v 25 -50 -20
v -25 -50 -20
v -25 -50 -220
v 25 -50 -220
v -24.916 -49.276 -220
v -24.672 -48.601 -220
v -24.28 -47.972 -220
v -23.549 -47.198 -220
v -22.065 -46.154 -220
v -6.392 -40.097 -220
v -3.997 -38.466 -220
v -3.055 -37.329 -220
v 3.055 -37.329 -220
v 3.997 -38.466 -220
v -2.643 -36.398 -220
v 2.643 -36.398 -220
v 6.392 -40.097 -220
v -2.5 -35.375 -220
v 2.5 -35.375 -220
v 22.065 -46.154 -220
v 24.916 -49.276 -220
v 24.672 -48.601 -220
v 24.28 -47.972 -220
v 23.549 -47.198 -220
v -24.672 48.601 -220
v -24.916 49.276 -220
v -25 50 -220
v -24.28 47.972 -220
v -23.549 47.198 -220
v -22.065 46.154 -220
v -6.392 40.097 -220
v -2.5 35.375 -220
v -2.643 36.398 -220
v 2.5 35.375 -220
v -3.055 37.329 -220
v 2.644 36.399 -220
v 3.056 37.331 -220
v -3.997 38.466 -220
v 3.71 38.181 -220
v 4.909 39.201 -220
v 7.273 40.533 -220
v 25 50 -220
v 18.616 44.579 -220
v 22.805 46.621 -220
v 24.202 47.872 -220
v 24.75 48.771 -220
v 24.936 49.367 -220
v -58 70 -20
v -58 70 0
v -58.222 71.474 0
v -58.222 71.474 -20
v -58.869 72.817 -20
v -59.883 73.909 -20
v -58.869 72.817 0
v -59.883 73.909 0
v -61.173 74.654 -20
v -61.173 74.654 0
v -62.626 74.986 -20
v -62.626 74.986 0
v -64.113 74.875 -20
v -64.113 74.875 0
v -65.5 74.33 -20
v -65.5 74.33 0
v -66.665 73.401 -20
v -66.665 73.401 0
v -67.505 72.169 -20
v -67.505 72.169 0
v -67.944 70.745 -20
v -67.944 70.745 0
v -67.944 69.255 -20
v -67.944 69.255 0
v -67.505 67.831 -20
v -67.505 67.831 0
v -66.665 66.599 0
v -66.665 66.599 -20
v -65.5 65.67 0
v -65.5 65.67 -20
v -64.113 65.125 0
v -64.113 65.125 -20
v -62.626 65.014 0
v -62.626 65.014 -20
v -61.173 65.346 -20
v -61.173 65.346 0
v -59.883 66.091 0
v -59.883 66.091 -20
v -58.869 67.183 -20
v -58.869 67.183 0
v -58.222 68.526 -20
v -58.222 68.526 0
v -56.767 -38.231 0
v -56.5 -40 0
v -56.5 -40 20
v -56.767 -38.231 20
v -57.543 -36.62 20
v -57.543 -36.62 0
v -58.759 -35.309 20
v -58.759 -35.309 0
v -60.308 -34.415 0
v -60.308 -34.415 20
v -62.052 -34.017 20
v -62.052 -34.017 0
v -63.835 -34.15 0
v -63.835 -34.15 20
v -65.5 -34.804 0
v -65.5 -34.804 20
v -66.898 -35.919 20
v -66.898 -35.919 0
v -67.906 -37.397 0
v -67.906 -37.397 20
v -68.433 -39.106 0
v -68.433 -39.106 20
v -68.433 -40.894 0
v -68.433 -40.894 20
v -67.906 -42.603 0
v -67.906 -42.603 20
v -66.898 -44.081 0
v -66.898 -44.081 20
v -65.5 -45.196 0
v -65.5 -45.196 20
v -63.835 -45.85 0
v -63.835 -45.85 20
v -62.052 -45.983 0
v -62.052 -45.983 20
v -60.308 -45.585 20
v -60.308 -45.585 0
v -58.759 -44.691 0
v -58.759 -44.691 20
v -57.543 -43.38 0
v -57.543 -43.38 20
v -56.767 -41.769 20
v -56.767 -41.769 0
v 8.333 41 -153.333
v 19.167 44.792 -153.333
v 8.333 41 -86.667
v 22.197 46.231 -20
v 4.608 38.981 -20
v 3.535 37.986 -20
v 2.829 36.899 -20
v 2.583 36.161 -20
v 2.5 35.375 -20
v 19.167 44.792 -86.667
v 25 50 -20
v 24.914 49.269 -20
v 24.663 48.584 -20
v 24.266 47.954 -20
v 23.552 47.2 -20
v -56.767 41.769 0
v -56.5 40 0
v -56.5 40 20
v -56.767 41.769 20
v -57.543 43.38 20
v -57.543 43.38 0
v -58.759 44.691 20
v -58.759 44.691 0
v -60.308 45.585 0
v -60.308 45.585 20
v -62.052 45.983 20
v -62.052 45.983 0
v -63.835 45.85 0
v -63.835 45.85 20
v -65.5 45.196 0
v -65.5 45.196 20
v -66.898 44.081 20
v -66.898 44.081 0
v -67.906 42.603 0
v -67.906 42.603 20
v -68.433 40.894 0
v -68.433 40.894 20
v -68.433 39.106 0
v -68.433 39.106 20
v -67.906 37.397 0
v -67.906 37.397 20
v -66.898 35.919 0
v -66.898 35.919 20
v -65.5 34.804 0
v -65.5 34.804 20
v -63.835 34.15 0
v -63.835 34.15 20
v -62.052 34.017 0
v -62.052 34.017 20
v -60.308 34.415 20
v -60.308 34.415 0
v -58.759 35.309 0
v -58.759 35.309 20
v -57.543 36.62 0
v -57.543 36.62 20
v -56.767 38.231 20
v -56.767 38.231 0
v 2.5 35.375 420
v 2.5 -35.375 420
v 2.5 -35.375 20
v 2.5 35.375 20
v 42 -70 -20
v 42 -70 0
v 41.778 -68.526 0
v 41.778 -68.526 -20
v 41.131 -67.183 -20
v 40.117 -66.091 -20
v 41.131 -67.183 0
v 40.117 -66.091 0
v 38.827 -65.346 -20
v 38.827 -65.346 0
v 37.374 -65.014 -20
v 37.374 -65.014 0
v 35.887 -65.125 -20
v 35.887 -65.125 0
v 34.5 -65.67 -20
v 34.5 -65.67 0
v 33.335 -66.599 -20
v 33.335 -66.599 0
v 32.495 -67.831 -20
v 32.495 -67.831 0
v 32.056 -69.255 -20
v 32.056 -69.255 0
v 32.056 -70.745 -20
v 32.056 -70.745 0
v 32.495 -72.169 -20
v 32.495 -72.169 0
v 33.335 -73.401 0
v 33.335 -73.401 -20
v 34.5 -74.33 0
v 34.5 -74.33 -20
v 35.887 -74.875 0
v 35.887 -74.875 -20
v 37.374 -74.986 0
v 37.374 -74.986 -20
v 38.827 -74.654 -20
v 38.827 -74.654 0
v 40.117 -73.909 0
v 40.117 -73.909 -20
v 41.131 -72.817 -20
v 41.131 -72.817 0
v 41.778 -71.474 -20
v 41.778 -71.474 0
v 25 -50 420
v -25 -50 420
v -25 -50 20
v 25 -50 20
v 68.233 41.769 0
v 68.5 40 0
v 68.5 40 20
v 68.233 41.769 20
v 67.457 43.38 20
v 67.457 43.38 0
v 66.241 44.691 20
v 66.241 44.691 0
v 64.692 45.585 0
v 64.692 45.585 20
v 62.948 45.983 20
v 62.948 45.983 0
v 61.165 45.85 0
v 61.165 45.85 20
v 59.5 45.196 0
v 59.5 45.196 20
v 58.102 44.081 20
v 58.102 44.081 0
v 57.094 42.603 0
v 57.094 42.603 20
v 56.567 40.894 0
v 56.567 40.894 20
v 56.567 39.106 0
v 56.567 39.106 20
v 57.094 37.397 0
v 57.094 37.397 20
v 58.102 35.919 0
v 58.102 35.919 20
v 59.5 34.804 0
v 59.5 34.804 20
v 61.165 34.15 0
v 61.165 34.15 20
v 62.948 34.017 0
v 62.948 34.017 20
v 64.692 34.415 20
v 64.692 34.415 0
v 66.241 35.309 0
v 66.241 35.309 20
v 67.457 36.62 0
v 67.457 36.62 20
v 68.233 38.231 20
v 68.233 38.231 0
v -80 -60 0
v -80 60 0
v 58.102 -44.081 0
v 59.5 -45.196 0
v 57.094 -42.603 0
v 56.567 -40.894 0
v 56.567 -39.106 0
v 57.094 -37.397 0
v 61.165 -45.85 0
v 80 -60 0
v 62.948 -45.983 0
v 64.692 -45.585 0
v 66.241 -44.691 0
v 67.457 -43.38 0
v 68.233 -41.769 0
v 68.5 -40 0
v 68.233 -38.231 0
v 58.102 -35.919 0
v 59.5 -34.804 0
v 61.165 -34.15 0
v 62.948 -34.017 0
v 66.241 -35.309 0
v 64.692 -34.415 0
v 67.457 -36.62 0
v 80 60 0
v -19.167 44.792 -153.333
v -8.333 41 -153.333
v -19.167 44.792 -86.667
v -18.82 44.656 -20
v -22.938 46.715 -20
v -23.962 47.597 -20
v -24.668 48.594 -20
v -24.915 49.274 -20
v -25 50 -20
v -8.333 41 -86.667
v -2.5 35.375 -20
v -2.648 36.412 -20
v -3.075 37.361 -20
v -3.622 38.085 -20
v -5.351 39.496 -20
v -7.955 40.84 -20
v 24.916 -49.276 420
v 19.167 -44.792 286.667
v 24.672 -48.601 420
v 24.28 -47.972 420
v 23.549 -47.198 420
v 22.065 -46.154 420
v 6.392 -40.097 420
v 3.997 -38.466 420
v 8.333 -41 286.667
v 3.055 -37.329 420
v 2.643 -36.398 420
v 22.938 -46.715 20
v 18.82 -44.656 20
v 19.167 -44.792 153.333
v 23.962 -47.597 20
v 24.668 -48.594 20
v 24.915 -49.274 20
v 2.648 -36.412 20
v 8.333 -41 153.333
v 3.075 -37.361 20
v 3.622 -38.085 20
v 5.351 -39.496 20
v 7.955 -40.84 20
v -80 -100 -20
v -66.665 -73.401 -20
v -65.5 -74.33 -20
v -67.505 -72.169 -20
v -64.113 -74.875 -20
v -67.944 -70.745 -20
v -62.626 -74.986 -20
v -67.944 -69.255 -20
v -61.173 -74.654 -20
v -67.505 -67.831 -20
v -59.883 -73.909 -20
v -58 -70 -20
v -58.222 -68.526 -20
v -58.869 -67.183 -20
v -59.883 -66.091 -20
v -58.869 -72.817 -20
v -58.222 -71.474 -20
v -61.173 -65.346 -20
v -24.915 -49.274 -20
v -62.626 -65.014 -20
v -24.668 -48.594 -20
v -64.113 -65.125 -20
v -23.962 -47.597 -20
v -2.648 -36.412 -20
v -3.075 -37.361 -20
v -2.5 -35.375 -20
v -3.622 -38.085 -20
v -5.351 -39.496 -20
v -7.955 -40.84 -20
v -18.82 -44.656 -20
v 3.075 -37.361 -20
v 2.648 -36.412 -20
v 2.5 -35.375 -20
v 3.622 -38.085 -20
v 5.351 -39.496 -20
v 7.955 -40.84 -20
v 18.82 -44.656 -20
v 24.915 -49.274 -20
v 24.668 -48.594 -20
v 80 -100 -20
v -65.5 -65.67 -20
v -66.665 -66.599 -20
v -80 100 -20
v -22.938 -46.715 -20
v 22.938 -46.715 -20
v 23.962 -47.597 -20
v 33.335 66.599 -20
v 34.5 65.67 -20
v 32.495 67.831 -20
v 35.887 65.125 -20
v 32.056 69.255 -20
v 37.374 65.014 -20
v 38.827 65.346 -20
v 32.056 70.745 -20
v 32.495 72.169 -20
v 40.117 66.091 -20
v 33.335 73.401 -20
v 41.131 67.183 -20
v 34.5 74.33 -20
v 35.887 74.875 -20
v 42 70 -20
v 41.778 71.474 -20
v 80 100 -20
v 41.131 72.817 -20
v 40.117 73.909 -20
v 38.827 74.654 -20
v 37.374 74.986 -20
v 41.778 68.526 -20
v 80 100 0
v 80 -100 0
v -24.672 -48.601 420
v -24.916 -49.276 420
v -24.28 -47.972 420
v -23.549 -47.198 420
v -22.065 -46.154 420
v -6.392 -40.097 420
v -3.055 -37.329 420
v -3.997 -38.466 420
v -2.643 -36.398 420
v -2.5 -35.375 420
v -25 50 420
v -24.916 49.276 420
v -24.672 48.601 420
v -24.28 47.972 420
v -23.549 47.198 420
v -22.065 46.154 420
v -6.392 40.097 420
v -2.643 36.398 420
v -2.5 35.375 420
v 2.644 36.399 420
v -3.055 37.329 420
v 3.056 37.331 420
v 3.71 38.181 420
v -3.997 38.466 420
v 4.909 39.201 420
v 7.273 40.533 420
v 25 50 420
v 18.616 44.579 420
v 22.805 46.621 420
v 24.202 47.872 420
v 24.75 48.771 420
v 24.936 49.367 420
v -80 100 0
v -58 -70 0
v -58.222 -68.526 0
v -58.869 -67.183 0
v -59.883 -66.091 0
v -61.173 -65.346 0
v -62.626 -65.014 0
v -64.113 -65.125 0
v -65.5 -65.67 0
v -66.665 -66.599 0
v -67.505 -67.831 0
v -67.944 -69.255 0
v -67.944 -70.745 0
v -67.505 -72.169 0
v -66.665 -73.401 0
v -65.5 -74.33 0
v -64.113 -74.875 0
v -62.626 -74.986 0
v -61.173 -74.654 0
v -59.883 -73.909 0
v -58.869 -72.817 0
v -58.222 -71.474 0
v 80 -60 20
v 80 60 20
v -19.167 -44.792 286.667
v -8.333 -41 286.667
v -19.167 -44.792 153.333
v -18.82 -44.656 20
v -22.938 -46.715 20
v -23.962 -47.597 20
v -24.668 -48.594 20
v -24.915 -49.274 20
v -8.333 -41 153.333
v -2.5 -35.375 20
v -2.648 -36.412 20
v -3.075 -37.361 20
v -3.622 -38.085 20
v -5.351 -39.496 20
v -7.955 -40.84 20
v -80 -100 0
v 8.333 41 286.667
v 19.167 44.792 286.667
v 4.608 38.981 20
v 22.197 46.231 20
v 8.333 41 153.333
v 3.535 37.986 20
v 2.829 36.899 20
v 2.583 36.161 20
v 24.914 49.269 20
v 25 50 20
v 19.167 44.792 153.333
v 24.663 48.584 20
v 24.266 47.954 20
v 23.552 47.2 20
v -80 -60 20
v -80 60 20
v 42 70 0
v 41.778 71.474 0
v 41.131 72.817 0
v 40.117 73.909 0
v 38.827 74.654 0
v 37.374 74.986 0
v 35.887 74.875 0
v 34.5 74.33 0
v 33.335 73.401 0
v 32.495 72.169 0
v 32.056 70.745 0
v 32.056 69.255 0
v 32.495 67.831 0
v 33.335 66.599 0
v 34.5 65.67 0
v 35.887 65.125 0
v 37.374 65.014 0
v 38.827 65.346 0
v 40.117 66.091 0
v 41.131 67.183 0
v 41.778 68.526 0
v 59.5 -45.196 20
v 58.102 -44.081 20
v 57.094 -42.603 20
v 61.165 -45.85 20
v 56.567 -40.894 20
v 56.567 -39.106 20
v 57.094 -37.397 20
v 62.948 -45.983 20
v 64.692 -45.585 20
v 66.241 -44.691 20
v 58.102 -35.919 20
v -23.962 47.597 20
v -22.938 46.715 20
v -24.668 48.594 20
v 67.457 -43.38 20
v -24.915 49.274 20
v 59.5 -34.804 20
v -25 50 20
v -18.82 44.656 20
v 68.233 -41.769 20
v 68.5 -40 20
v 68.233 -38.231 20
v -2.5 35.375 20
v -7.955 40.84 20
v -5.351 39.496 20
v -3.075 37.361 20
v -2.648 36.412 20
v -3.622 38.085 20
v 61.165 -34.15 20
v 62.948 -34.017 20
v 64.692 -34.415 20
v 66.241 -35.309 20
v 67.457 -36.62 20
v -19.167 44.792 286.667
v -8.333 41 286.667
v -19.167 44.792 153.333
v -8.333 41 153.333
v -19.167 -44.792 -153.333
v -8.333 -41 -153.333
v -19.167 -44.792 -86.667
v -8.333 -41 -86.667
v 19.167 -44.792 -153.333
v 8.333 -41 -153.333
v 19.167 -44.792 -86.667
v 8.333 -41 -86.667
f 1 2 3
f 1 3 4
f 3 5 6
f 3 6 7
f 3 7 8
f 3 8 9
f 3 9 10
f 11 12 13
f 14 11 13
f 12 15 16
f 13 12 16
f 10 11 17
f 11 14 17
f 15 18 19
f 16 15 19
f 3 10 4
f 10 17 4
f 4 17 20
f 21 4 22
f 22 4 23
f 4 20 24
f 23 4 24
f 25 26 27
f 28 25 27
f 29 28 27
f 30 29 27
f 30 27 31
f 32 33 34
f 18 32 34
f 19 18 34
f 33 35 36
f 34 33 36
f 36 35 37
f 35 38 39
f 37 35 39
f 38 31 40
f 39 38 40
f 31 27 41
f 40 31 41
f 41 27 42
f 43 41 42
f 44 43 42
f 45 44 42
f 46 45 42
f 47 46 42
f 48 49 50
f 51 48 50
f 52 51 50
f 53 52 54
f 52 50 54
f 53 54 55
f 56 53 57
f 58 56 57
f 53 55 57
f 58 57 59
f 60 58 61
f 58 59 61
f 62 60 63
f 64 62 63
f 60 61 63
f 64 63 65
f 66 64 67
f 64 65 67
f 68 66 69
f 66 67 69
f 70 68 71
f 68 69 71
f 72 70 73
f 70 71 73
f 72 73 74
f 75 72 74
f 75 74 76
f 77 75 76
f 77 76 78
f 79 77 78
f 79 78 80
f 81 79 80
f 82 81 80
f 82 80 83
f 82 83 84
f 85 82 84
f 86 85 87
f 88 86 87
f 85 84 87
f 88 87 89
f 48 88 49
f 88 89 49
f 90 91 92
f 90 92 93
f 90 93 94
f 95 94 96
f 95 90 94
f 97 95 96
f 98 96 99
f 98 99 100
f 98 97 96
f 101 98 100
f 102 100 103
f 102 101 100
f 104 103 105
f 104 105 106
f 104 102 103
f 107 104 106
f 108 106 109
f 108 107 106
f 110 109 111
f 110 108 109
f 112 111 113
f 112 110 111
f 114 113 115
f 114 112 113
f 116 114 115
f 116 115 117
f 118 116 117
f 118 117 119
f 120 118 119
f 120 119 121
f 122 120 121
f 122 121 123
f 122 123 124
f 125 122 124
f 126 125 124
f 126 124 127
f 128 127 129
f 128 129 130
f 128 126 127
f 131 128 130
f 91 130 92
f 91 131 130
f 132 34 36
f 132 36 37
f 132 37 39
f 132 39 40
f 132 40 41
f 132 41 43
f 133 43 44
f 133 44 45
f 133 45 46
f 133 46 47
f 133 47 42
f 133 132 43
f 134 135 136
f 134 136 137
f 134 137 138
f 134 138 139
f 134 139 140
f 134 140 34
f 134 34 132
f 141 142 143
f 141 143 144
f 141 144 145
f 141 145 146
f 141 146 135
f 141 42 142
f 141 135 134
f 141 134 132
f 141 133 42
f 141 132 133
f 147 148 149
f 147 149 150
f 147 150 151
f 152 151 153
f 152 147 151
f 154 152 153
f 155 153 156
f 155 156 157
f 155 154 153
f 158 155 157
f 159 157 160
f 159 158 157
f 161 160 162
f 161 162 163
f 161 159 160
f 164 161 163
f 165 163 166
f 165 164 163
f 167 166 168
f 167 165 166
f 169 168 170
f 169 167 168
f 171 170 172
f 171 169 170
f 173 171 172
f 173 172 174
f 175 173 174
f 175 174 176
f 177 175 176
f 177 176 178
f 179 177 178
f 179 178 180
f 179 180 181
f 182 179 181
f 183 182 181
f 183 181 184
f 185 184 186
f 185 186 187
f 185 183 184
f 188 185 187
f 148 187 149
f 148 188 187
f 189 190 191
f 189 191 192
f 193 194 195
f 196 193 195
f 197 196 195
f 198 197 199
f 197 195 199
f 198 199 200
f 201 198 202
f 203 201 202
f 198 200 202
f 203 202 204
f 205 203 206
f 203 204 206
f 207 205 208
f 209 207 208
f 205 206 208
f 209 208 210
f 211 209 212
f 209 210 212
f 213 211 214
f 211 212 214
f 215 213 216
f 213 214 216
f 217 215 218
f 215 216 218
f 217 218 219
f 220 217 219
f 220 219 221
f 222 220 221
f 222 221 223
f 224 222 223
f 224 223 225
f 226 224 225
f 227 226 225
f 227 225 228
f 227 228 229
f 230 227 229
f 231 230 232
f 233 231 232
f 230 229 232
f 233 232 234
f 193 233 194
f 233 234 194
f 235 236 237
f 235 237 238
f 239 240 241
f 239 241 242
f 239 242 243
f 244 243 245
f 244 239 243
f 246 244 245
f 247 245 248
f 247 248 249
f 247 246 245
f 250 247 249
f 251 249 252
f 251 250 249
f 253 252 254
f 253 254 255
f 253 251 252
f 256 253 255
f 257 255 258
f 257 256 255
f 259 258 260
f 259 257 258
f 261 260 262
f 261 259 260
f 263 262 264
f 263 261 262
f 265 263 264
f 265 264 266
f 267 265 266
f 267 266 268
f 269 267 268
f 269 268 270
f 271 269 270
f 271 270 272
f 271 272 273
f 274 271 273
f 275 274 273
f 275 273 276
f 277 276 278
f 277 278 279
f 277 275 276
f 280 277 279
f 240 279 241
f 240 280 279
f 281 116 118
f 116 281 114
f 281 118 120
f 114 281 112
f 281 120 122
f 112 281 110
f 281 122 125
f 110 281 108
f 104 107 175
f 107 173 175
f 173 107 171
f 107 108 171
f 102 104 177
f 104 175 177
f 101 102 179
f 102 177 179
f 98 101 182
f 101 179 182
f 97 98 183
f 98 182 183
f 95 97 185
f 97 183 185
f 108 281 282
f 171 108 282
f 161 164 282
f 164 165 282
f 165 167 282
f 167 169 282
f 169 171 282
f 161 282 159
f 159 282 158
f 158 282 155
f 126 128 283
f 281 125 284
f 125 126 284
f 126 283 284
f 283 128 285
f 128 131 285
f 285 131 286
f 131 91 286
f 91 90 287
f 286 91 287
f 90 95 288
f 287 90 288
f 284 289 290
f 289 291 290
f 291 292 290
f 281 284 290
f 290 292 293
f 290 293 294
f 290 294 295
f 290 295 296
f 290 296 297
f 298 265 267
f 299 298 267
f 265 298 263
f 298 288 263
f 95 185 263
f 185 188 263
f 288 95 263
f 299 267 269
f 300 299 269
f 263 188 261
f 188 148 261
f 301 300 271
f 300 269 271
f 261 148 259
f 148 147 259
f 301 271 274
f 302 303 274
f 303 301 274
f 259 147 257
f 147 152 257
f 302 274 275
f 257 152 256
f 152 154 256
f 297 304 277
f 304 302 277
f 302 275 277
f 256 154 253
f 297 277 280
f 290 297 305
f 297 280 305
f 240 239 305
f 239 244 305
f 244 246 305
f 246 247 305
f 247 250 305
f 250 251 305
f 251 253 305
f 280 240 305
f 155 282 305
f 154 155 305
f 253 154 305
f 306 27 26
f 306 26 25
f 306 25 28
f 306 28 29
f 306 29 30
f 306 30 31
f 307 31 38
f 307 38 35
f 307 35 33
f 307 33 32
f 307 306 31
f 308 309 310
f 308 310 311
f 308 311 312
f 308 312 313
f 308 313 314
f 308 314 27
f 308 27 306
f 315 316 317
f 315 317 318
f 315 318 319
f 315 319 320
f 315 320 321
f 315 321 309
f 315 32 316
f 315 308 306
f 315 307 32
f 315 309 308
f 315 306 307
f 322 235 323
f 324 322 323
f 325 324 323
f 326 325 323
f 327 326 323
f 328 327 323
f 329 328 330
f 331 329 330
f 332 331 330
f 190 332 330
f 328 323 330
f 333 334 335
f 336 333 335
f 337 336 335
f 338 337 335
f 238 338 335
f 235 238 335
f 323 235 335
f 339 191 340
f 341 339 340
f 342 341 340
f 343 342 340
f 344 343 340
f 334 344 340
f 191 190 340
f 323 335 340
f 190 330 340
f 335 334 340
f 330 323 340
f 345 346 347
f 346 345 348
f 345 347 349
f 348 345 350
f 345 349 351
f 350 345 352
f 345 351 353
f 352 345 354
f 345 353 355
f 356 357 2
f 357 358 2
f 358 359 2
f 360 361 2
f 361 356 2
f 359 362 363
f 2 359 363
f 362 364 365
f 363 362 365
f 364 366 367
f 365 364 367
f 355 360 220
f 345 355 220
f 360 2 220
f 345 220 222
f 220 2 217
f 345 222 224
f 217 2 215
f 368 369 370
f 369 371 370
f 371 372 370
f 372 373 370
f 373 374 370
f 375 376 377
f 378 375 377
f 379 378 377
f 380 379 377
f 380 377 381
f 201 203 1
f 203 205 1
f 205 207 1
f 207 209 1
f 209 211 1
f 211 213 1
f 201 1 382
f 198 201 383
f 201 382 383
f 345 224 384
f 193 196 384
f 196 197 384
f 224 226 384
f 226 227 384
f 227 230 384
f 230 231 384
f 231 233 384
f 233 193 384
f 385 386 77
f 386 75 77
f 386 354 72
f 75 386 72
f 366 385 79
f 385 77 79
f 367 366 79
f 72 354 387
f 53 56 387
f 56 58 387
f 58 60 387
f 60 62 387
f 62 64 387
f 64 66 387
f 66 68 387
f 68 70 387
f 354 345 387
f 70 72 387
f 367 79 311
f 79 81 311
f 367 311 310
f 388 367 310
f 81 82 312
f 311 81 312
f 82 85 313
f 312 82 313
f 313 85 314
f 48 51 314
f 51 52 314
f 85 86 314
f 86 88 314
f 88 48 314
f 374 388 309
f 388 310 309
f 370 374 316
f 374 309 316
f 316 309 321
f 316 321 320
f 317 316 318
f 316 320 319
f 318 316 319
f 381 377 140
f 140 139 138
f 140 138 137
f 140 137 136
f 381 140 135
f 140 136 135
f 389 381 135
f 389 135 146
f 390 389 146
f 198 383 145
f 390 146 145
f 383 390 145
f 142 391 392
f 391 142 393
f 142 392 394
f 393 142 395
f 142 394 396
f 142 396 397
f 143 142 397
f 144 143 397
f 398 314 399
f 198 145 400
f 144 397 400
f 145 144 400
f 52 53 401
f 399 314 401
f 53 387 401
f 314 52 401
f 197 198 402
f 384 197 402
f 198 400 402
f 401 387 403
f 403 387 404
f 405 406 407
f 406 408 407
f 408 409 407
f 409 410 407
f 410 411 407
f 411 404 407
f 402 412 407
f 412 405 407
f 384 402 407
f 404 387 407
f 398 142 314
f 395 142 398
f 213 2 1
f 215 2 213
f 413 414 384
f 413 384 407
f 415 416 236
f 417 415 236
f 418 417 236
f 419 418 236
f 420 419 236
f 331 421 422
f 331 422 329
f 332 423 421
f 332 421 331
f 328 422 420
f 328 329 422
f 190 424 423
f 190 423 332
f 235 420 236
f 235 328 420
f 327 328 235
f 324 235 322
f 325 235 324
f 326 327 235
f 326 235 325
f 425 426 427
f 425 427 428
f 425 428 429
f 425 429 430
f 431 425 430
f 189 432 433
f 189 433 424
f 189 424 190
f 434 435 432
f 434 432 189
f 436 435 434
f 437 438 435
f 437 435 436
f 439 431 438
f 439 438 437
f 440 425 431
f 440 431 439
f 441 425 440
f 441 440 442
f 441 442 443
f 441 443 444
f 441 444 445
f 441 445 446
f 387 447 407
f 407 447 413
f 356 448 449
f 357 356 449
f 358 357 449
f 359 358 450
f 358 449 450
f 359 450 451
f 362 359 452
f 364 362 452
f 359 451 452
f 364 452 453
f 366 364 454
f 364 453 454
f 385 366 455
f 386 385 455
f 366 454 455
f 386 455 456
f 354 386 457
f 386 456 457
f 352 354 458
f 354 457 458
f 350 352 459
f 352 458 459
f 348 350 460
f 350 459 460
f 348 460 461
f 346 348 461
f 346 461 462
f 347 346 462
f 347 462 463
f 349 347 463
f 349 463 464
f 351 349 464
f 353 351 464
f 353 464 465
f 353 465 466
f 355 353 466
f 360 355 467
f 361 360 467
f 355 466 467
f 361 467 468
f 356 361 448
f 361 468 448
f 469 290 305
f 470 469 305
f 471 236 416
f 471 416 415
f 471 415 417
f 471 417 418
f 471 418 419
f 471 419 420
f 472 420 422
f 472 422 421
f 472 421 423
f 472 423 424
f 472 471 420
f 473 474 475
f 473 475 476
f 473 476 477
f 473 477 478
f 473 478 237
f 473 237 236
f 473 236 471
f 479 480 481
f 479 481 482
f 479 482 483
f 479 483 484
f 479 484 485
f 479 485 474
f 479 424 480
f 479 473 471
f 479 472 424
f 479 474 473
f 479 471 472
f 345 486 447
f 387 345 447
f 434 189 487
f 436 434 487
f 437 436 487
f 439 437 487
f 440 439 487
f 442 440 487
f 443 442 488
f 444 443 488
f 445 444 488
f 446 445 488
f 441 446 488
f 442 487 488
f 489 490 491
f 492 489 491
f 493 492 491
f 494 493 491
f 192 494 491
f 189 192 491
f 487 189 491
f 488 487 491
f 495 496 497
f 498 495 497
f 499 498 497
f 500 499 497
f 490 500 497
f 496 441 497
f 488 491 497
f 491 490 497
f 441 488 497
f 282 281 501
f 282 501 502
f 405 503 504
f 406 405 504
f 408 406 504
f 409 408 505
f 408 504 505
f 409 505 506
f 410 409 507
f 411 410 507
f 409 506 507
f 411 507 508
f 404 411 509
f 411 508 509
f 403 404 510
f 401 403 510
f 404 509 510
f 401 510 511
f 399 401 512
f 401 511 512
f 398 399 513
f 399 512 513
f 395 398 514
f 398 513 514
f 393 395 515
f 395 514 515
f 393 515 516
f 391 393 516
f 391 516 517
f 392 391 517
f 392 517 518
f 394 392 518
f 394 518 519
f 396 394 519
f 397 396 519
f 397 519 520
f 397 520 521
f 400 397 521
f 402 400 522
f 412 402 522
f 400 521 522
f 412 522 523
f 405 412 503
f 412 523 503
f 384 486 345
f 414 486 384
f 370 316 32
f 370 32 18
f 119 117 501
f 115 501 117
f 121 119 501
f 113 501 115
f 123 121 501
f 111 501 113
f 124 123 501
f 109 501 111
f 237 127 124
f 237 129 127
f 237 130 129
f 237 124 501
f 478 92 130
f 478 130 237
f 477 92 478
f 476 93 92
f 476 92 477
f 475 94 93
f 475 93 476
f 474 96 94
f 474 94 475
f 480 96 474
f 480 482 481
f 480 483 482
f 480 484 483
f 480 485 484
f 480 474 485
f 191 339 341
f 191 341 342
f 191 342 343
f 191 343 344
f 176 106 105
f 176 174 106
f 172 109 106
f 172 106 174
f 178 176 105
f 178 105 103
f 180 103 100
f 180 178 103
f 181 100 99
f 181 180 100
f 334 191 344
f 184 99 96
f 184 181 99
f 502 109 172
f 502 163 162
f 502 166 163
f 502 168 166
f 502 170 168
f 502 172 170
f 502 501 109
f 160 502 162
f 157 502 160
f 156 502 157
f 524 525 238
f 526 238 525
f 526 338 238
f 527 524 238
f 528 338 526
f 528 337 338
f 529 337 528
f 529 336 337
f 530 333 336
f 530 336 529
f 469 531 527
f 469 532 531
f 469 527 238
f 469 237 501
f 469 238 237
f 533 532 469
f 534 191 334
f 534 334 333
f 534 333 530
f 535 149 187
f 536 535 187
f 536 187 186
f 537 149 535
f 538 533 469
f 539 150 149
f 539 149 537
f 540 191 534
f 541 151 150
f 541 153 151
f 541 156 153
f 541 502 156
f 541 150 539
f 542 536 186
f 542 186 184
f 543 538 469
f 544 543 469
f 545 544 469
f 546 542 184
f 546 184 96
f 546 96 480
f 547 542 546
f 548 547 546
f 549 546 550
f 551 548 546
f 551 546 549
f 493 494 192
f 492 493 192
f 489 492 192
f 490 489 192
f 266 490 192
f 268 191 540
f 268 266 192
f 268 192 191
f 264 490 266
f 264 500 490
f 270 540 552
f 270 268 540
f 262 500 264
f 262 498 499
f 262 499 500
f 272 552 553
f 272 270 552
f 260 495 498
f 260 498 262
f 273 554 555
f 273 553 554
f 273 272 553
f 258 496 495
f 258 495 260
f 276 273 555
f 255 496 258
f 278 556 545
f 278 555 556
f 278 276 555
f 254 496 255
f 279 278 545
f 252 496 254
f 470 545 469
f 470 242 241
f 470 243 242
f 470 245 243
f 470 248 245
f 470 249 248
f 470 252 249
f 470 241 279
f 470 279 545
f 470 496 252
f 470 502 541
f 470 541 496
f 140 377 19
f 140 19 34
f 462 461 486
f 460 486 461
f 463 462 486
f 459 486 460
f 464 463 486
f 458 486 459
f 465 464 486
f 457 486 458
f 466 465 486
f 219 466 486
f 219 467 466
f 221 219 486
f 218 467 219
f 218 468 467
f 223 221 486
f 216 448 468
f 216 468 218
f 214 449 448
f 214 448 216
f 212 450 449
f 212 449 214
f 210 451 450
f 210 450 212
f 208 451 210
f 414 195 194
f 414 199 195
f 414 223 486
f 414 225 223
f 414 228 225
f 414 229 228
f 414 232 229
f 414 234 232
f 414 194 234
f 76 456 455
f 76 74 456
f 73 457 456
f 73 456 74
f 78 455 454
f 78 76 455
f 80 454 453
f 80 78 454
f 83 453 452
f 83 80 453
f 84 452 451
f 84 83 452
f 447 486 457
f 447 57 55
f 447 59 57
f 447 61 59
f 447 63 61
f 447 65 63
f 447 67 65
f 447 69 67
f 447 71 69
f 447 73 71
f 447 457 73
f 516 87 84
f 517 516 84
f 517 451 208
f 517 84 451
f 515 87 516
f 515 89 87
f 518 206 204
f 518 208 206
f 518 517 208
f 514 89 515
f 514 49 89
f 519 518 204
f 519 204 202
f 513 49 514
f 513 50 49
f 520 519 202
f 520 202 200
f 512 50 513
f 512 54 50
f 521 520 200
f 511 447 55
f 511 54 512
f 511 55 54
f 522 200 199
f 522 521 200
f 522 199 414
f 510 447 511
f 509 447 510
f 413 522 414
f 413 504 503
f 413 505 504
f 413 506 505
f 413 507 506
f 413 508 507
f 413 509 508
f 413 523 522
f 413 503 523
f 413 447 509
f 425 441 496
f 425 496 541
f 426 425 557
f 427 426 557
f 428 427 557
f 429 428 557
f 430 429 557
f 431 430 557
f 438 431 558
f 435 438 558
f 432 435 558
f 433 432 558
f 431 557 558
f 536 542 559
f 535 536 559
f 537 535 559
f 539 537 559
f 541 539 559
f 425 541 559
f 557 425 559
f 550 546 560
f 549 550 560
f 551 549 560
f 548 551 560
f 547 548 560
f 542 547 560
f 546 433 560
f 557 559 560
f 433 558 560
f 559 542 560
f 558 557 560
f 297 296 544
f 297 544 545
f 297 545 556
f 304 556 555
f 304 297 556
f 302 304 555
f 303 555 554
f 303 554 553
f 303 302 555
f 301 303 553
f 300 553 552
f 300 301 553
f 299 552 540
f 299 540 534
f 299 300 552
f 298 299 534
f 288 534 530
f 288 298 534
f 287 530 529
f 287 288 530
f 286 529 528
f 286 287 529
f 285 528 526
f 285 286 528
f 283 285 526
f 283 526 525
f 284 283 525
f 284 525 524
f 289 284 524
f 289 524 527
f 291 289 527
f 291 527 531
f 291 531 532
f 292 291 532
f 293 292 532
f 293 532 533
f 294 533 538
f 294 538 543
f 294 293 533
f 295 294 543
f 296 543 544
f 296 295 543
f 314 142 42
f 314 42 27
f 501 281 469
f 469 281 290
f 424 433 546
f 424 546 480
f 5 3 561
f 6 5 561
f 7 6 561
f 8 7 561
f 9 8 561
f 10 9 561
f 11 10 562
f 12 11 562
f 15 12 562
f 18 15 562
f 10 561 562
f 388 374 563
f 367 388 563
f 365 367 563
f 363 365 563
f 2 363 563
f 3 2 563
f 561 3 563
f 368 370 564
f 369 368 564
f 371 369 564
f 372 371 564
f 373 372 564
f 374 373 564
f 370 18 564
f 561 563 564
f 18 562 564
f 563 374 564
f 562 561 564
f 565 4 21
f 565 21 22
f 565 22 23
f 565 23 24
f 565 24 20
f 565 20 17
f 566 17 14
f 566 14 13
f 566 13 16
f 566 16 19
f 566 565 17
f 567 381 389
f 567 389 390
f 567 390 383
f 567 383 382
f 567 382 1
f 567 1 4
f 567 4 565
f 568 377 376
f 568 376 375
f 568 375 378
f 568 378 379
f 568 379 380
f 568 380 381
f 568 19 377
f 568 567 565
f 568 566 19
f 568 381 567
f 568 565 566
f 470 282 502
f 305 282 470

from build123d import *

# Parameters (mm, degrees)
F1_DEPTH = 420
F0_W     = 160
F0_H     = 120
F0_R     = 6
F2_DEPTH = 20
F3_DEPTH = 220
F4_W     = 160
F4_H     = 200
F4_R     = 5
F5_DEPTH = 20


with BuildPart() as f1:
    # F0 (on Top) → F1 (new body)
    with BuildSketch(Plane.XY):
        with BuildLine():
            Line((25, 50), (-25, 50))
            add(Edge.make_bspline(
                [(-25, 50), (-25, 43), (-2.5, 43), (-2.5, 35.375)],
                knots=[0, 0, 0, 0, 26.8354359942, 26.8354359942, 26.8354359942, 26.8354359942], degree=3))
            Line((-2.5, 35.375), (-2.5, -35.375))
            add(Edge.make_bspline(
                [(-25, -50), (-25, -43), (-2.5, -43), (-2.5, -35.375)],
                knots=[0, 0, 0, 0, 26.8354359942, 26.8354359942, 26.8354359942, 26.8354359942], degree=3))
            Line((-25, -50), (25, -50))
            add(Edge.make_bspline(
                [(25, -50), (25, -43), (2.5, -43), (2.5, -35.375)],
                knots=[0, 0, 0, 0, 26.8354359942, 26.8354359942, 26.8354359942, 26.8354359942], degree=3))
            Line((2.5, -35.375), (2.5, 35.375))
            add(Edge.make_bspline(
                [(2.5, 35.375), (2.5, 43), (25, 43), (25, 50)],
                knots=[0, 0, 0, 0, 26.8354359942, 26.8354359942, 26.8354359942, 26.8354359942], degree=3))
        make_face()
    extrude(amount=F1_DEPTH)

    # F0 (on Top) → F2 (join)
    with BuildSketch(Plane.XY):
        Rectangle(F0_W, F0_H)
        with Locations((-62.5, -40)):
            Circle(F0_R, mode=Mode.SUBTRACT)
        with Locations((62.5, -40)):
            Circle(F0_R, mode=Mode.SUBTRACT)
        with Locations((-62.5, 40)):
            Circle(F0_R, mode=Mode.SUBTRACT)
        with BuildLine():
            add(Edge.make_bspline(
                [(-25, 50), (-25, 43), (-2.5, 43), (-2.5, 35.375)],
                knots=[0, 0, 0, 0, 26.8354359942, 26.8354359942, 26.8354359942, 26.8354359942], degree=3))
            Line((-25, 50), (25, 50))
            add(Edge.make_bspline(
                [(2.5, 35.375), (2.5, 43), (25, 43), (25, 50)],
                knots=[0, 0, 0, 0, 26.8354359942, 26.8354359942, 26.8354359942, 26.8354359942], degree=3))
            Line((2.5, 35.375), (2.5, -35.375))
            add(Edge.make_bspline(
                [(25, -50), (25, -43), (2.5, -43), (2.5, -35.375)],
                knots=[0, 0, 0, 0, 26.8354359942, 26.8354359942, 26.8354359942, 26.8354359942], degree=3))
            Line((25, -50), (-25, -50))
            add(Edge.make_bspline(
                [(-25, -50), (-25, -43), (-2.5, -43), (-2.5, -35.375)],
                knots=[0, 0, 0, 0, 26.8354359942, 26.8354359942, 26.8354359942, 26.8354359942], degree=3))
            Line((-2.5, -35.375), (-2.5, 35.375))
        make_face(mode=Mode.SUBTRACT)
        with Locations((62.5, 40)):
            Circle(F0_R, mode=Mode.SUBTRACT)
        with BuildLine():
            Line((25, 50), (-25, 50))
            add(Edge.make_bspline(
                [(-25, 50), (-25, 43), (-2.5, 43), (-2.5, 35.375)],
                knots=[0, 0, 0, 0, 26.8354359942, 26.8354359942, 26.8354359942, 26.8354359942], degree=3))
            Line((-2.5, 35.375), (-2.5, -35.375))
            add(Edge.make_bspline(
                [(-25, -50), (-25, -43), (-2.5, -43), (-2.5, -35.375)],
                knots=[0, 0, 0, 0, 26.8354359942, 26.8354359942, 26.8354359942, 26.8354359942], degree=3))
            Line((-25, -50), (25, -50))
            add(Edge.make_bspline(
                [(25, -50), (25, -43), (2.5, -43), (2.5, -35.375)],
                knots=[0, 0, 0, 0, 26.8354359942, 26.8354359942, 26.8354359942, 26.8354359942], degree=3))
            Line((2.5, -35.375), (2.5, 35.375))
            add(Edge.make_bspline(
                [(2.5, 35.375), (2.5, 43), (25, 43), (25, 50)],
                knots=[0, 0, 0, 0, 26.8354359942, 26.8354359942, 26.8354359942, 26.8354359942], degree=3))
        make_face()
    extrude(amount=F2_DEPTH)


with BuildPart() as f3:
    # F0 (on Top) → F3 (new body)
    with BuildSketch(Plane.XY):
        with BuildLine():
            Line((25, 50), (-25, 50))
            add(Edge.make_bspline(
                [(-25, 50), (-25, 43), (-2.5, 43), (-2.5, 35.375)],
                knots=[0, 0, 0, 0, 26.8354359942, 26.8354359942, 26.8354359942, 26.8354359942], degree=3))
            Line((-2.5, 35.375), (-2.5, -35.375))
            add(Edge.make_bspline(
                [(-25, -50), (-25, -43), (-2.5, -43), (-2.5, -35.375)],
                knots=[0, 0, 0, 0, 26.8354359942, 26.8354359942, 26.8354359942, 26.8354359942], degree=3))
            Line((-25, -50), (25, -50))
            add(Edge.make_bspline(
                [(25, -50), (25, -43), (2.5, -43), (2.5, -35.375)],
                knots=[0, 0, 0, 0, 26.8354359942, 26.8354359942, 26.8354359942, 26.8354359942], degree=3))
            Line((2.5, -35.375), (2.5, 35.375))
            add(Edge.make_bspline(
                [(2.5, 35.375), (2.5, 43), (25, 43), (25, 50)],
                knots=[0, 0, 0, 0, 26.8354359942, 26.8354359942, 26.8354359942, 26.8354359942], degree=3))
        make_face()
    extrude(amount=-F3_DEPTH)

    # F4 (on Top) → F5 (join)
    with BuildSketch(Plane.XY):
        Rectangle(F4_W, F4_H)
        with Locations((-63, -70)):
            Circle(F4_R, mode=Mode.SUBTRACT)
        with Locations((37, -70)):
            Circle(F4_R, mode=Mode.SUBTRACT)
        with Locations((-63, 70)):
            Circle(F4_R, mode=Mode.SUBTRACT)
        with Locations((37, 70)):
            Circle(F4_R, mode=Mode.SUBTRACT)
    extrude(amount=-F5_DEPTH)


solid = Compound([f1.part, f3.part])
